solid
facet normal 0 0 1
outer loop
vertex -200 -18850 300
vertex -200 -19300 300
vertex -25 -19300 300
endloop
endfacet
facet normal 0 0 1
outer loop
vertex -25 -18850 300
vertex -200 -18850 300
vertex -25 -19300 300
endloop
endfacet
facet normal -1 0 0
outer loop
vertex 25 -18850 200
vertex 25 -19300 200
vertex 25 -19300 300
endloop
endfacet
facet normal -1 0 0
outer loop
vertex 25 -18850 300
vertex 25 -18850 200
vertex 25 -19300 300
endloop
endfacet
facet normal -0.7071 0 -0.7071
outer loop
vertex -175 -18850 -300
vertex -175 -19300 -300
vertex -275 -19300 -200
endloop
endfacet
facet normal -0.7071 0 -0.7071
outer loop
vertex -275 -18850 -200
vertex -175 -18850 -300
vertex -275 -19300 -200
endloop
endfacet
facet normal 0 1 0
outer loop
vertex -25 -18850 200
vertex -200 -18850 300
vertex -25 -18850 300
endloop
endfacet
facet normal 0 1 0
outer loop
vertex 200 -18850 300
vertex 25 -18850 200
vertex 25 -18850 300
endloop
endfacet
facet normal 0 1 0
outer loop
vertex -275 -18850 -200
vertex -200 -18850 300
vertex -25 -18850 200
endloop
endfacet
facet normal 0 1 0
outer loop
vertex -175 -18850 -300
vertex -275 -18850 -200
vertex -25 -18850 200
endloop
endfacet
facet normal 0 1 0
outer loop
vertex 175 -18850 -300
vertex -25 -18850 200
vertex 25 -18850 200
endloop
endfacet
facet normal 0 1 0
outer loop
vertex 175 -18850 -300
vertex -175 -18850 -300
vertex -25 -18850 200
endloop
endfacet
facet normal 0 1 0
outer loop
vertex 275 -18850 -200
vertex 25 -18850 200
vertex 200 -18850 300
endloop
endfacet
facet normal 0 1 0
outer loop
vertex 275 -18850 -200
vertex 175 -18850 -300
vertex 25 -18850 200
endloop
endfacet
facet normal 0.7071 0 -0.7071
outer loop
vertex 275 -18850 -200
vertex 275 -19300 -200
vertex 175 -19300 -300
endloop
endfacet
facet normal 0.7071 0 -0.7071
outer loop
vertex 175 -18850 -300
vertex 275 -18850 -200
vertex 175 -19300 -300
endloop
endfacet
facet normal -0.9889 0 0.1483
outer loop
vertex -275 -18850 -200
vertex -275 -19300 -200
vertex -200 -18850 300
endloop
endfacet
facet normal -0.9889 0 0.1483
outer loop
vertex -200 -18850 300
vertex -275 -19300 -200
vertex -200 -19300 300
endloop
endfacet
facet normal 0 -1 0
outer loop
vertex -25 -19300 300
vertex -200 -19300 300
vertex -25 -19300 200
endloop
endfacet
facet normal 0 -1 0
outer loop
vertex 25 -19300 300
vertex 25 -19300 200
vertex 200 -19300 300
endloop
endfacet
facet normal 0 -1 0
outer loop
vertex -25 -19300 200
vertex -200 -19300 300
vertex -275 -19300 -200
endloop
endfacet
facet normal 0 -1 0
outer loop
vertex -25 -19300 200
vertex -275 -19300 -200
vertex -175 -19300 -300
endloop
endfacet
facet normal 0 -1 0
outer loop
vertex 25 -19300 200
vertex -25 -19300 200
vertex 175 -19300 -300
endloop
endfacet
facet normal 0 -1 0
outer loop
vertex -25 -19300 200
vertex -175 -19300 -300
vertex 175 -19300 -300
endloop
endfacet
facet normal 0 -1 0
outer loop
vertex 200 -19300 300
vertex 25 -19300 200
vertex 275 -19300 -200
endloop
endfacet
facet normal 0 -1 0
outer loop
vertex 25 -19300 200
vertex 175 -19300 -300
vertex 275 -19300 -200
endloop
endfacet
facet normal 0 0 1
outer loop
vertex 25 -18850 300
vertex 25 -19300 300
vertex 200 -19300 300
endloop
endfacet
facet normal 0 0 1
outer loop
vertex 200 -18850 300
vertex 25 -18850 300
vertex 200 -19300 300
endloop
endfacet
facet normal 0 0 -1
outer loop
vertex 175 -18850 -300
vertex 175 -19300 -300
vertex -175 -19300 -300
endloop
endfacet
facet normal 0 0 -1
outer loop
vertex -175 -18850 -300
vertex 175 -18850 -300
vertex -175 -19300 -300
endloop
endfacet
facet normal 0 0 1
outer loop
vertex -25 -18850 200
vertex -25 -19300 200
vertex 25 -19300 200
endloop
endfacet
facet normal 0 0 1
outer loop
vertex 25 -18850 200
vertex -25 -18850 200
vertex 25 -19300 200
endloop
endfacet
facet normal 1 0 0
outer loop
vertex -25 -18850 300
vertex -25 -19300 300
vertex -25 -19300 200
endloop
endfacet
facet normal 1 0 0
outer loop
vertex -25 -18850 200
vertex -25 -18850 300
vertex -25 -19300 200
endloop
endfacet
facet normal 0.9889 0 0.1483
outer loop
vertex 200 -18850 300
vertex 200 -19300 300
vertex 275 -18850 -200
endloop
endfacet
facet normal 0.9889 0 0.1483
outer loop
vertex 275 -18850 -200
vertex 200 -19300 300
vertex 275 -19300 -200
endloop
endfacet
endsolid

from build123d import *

# Parameters (mm, degrees)
BOSS_EXTRUDE1_START = -19300
BOSS_EXTRUDE1_DEPTH = 450


with BuildPart() as part:
    # Sketch1 → Boss-Extrude1 (new body)
    with BuildSketch(Plane(origin=(0, 0, 0), x_dir=(1, 0, 0), z_dir=(0, 1, 0)).offset(BOSS_EXTRUDE1_START)):
        Polygon((175, 300), (-175, 300), (-275, 200), (-200, -300), (-25, -300), (-25, -200), (25, -200), (25, -300), (200, -300), (275, 200), align=None)
    extrude(amount=BOSS_EXTRUDE1_DEPTH)


solid = part.part
